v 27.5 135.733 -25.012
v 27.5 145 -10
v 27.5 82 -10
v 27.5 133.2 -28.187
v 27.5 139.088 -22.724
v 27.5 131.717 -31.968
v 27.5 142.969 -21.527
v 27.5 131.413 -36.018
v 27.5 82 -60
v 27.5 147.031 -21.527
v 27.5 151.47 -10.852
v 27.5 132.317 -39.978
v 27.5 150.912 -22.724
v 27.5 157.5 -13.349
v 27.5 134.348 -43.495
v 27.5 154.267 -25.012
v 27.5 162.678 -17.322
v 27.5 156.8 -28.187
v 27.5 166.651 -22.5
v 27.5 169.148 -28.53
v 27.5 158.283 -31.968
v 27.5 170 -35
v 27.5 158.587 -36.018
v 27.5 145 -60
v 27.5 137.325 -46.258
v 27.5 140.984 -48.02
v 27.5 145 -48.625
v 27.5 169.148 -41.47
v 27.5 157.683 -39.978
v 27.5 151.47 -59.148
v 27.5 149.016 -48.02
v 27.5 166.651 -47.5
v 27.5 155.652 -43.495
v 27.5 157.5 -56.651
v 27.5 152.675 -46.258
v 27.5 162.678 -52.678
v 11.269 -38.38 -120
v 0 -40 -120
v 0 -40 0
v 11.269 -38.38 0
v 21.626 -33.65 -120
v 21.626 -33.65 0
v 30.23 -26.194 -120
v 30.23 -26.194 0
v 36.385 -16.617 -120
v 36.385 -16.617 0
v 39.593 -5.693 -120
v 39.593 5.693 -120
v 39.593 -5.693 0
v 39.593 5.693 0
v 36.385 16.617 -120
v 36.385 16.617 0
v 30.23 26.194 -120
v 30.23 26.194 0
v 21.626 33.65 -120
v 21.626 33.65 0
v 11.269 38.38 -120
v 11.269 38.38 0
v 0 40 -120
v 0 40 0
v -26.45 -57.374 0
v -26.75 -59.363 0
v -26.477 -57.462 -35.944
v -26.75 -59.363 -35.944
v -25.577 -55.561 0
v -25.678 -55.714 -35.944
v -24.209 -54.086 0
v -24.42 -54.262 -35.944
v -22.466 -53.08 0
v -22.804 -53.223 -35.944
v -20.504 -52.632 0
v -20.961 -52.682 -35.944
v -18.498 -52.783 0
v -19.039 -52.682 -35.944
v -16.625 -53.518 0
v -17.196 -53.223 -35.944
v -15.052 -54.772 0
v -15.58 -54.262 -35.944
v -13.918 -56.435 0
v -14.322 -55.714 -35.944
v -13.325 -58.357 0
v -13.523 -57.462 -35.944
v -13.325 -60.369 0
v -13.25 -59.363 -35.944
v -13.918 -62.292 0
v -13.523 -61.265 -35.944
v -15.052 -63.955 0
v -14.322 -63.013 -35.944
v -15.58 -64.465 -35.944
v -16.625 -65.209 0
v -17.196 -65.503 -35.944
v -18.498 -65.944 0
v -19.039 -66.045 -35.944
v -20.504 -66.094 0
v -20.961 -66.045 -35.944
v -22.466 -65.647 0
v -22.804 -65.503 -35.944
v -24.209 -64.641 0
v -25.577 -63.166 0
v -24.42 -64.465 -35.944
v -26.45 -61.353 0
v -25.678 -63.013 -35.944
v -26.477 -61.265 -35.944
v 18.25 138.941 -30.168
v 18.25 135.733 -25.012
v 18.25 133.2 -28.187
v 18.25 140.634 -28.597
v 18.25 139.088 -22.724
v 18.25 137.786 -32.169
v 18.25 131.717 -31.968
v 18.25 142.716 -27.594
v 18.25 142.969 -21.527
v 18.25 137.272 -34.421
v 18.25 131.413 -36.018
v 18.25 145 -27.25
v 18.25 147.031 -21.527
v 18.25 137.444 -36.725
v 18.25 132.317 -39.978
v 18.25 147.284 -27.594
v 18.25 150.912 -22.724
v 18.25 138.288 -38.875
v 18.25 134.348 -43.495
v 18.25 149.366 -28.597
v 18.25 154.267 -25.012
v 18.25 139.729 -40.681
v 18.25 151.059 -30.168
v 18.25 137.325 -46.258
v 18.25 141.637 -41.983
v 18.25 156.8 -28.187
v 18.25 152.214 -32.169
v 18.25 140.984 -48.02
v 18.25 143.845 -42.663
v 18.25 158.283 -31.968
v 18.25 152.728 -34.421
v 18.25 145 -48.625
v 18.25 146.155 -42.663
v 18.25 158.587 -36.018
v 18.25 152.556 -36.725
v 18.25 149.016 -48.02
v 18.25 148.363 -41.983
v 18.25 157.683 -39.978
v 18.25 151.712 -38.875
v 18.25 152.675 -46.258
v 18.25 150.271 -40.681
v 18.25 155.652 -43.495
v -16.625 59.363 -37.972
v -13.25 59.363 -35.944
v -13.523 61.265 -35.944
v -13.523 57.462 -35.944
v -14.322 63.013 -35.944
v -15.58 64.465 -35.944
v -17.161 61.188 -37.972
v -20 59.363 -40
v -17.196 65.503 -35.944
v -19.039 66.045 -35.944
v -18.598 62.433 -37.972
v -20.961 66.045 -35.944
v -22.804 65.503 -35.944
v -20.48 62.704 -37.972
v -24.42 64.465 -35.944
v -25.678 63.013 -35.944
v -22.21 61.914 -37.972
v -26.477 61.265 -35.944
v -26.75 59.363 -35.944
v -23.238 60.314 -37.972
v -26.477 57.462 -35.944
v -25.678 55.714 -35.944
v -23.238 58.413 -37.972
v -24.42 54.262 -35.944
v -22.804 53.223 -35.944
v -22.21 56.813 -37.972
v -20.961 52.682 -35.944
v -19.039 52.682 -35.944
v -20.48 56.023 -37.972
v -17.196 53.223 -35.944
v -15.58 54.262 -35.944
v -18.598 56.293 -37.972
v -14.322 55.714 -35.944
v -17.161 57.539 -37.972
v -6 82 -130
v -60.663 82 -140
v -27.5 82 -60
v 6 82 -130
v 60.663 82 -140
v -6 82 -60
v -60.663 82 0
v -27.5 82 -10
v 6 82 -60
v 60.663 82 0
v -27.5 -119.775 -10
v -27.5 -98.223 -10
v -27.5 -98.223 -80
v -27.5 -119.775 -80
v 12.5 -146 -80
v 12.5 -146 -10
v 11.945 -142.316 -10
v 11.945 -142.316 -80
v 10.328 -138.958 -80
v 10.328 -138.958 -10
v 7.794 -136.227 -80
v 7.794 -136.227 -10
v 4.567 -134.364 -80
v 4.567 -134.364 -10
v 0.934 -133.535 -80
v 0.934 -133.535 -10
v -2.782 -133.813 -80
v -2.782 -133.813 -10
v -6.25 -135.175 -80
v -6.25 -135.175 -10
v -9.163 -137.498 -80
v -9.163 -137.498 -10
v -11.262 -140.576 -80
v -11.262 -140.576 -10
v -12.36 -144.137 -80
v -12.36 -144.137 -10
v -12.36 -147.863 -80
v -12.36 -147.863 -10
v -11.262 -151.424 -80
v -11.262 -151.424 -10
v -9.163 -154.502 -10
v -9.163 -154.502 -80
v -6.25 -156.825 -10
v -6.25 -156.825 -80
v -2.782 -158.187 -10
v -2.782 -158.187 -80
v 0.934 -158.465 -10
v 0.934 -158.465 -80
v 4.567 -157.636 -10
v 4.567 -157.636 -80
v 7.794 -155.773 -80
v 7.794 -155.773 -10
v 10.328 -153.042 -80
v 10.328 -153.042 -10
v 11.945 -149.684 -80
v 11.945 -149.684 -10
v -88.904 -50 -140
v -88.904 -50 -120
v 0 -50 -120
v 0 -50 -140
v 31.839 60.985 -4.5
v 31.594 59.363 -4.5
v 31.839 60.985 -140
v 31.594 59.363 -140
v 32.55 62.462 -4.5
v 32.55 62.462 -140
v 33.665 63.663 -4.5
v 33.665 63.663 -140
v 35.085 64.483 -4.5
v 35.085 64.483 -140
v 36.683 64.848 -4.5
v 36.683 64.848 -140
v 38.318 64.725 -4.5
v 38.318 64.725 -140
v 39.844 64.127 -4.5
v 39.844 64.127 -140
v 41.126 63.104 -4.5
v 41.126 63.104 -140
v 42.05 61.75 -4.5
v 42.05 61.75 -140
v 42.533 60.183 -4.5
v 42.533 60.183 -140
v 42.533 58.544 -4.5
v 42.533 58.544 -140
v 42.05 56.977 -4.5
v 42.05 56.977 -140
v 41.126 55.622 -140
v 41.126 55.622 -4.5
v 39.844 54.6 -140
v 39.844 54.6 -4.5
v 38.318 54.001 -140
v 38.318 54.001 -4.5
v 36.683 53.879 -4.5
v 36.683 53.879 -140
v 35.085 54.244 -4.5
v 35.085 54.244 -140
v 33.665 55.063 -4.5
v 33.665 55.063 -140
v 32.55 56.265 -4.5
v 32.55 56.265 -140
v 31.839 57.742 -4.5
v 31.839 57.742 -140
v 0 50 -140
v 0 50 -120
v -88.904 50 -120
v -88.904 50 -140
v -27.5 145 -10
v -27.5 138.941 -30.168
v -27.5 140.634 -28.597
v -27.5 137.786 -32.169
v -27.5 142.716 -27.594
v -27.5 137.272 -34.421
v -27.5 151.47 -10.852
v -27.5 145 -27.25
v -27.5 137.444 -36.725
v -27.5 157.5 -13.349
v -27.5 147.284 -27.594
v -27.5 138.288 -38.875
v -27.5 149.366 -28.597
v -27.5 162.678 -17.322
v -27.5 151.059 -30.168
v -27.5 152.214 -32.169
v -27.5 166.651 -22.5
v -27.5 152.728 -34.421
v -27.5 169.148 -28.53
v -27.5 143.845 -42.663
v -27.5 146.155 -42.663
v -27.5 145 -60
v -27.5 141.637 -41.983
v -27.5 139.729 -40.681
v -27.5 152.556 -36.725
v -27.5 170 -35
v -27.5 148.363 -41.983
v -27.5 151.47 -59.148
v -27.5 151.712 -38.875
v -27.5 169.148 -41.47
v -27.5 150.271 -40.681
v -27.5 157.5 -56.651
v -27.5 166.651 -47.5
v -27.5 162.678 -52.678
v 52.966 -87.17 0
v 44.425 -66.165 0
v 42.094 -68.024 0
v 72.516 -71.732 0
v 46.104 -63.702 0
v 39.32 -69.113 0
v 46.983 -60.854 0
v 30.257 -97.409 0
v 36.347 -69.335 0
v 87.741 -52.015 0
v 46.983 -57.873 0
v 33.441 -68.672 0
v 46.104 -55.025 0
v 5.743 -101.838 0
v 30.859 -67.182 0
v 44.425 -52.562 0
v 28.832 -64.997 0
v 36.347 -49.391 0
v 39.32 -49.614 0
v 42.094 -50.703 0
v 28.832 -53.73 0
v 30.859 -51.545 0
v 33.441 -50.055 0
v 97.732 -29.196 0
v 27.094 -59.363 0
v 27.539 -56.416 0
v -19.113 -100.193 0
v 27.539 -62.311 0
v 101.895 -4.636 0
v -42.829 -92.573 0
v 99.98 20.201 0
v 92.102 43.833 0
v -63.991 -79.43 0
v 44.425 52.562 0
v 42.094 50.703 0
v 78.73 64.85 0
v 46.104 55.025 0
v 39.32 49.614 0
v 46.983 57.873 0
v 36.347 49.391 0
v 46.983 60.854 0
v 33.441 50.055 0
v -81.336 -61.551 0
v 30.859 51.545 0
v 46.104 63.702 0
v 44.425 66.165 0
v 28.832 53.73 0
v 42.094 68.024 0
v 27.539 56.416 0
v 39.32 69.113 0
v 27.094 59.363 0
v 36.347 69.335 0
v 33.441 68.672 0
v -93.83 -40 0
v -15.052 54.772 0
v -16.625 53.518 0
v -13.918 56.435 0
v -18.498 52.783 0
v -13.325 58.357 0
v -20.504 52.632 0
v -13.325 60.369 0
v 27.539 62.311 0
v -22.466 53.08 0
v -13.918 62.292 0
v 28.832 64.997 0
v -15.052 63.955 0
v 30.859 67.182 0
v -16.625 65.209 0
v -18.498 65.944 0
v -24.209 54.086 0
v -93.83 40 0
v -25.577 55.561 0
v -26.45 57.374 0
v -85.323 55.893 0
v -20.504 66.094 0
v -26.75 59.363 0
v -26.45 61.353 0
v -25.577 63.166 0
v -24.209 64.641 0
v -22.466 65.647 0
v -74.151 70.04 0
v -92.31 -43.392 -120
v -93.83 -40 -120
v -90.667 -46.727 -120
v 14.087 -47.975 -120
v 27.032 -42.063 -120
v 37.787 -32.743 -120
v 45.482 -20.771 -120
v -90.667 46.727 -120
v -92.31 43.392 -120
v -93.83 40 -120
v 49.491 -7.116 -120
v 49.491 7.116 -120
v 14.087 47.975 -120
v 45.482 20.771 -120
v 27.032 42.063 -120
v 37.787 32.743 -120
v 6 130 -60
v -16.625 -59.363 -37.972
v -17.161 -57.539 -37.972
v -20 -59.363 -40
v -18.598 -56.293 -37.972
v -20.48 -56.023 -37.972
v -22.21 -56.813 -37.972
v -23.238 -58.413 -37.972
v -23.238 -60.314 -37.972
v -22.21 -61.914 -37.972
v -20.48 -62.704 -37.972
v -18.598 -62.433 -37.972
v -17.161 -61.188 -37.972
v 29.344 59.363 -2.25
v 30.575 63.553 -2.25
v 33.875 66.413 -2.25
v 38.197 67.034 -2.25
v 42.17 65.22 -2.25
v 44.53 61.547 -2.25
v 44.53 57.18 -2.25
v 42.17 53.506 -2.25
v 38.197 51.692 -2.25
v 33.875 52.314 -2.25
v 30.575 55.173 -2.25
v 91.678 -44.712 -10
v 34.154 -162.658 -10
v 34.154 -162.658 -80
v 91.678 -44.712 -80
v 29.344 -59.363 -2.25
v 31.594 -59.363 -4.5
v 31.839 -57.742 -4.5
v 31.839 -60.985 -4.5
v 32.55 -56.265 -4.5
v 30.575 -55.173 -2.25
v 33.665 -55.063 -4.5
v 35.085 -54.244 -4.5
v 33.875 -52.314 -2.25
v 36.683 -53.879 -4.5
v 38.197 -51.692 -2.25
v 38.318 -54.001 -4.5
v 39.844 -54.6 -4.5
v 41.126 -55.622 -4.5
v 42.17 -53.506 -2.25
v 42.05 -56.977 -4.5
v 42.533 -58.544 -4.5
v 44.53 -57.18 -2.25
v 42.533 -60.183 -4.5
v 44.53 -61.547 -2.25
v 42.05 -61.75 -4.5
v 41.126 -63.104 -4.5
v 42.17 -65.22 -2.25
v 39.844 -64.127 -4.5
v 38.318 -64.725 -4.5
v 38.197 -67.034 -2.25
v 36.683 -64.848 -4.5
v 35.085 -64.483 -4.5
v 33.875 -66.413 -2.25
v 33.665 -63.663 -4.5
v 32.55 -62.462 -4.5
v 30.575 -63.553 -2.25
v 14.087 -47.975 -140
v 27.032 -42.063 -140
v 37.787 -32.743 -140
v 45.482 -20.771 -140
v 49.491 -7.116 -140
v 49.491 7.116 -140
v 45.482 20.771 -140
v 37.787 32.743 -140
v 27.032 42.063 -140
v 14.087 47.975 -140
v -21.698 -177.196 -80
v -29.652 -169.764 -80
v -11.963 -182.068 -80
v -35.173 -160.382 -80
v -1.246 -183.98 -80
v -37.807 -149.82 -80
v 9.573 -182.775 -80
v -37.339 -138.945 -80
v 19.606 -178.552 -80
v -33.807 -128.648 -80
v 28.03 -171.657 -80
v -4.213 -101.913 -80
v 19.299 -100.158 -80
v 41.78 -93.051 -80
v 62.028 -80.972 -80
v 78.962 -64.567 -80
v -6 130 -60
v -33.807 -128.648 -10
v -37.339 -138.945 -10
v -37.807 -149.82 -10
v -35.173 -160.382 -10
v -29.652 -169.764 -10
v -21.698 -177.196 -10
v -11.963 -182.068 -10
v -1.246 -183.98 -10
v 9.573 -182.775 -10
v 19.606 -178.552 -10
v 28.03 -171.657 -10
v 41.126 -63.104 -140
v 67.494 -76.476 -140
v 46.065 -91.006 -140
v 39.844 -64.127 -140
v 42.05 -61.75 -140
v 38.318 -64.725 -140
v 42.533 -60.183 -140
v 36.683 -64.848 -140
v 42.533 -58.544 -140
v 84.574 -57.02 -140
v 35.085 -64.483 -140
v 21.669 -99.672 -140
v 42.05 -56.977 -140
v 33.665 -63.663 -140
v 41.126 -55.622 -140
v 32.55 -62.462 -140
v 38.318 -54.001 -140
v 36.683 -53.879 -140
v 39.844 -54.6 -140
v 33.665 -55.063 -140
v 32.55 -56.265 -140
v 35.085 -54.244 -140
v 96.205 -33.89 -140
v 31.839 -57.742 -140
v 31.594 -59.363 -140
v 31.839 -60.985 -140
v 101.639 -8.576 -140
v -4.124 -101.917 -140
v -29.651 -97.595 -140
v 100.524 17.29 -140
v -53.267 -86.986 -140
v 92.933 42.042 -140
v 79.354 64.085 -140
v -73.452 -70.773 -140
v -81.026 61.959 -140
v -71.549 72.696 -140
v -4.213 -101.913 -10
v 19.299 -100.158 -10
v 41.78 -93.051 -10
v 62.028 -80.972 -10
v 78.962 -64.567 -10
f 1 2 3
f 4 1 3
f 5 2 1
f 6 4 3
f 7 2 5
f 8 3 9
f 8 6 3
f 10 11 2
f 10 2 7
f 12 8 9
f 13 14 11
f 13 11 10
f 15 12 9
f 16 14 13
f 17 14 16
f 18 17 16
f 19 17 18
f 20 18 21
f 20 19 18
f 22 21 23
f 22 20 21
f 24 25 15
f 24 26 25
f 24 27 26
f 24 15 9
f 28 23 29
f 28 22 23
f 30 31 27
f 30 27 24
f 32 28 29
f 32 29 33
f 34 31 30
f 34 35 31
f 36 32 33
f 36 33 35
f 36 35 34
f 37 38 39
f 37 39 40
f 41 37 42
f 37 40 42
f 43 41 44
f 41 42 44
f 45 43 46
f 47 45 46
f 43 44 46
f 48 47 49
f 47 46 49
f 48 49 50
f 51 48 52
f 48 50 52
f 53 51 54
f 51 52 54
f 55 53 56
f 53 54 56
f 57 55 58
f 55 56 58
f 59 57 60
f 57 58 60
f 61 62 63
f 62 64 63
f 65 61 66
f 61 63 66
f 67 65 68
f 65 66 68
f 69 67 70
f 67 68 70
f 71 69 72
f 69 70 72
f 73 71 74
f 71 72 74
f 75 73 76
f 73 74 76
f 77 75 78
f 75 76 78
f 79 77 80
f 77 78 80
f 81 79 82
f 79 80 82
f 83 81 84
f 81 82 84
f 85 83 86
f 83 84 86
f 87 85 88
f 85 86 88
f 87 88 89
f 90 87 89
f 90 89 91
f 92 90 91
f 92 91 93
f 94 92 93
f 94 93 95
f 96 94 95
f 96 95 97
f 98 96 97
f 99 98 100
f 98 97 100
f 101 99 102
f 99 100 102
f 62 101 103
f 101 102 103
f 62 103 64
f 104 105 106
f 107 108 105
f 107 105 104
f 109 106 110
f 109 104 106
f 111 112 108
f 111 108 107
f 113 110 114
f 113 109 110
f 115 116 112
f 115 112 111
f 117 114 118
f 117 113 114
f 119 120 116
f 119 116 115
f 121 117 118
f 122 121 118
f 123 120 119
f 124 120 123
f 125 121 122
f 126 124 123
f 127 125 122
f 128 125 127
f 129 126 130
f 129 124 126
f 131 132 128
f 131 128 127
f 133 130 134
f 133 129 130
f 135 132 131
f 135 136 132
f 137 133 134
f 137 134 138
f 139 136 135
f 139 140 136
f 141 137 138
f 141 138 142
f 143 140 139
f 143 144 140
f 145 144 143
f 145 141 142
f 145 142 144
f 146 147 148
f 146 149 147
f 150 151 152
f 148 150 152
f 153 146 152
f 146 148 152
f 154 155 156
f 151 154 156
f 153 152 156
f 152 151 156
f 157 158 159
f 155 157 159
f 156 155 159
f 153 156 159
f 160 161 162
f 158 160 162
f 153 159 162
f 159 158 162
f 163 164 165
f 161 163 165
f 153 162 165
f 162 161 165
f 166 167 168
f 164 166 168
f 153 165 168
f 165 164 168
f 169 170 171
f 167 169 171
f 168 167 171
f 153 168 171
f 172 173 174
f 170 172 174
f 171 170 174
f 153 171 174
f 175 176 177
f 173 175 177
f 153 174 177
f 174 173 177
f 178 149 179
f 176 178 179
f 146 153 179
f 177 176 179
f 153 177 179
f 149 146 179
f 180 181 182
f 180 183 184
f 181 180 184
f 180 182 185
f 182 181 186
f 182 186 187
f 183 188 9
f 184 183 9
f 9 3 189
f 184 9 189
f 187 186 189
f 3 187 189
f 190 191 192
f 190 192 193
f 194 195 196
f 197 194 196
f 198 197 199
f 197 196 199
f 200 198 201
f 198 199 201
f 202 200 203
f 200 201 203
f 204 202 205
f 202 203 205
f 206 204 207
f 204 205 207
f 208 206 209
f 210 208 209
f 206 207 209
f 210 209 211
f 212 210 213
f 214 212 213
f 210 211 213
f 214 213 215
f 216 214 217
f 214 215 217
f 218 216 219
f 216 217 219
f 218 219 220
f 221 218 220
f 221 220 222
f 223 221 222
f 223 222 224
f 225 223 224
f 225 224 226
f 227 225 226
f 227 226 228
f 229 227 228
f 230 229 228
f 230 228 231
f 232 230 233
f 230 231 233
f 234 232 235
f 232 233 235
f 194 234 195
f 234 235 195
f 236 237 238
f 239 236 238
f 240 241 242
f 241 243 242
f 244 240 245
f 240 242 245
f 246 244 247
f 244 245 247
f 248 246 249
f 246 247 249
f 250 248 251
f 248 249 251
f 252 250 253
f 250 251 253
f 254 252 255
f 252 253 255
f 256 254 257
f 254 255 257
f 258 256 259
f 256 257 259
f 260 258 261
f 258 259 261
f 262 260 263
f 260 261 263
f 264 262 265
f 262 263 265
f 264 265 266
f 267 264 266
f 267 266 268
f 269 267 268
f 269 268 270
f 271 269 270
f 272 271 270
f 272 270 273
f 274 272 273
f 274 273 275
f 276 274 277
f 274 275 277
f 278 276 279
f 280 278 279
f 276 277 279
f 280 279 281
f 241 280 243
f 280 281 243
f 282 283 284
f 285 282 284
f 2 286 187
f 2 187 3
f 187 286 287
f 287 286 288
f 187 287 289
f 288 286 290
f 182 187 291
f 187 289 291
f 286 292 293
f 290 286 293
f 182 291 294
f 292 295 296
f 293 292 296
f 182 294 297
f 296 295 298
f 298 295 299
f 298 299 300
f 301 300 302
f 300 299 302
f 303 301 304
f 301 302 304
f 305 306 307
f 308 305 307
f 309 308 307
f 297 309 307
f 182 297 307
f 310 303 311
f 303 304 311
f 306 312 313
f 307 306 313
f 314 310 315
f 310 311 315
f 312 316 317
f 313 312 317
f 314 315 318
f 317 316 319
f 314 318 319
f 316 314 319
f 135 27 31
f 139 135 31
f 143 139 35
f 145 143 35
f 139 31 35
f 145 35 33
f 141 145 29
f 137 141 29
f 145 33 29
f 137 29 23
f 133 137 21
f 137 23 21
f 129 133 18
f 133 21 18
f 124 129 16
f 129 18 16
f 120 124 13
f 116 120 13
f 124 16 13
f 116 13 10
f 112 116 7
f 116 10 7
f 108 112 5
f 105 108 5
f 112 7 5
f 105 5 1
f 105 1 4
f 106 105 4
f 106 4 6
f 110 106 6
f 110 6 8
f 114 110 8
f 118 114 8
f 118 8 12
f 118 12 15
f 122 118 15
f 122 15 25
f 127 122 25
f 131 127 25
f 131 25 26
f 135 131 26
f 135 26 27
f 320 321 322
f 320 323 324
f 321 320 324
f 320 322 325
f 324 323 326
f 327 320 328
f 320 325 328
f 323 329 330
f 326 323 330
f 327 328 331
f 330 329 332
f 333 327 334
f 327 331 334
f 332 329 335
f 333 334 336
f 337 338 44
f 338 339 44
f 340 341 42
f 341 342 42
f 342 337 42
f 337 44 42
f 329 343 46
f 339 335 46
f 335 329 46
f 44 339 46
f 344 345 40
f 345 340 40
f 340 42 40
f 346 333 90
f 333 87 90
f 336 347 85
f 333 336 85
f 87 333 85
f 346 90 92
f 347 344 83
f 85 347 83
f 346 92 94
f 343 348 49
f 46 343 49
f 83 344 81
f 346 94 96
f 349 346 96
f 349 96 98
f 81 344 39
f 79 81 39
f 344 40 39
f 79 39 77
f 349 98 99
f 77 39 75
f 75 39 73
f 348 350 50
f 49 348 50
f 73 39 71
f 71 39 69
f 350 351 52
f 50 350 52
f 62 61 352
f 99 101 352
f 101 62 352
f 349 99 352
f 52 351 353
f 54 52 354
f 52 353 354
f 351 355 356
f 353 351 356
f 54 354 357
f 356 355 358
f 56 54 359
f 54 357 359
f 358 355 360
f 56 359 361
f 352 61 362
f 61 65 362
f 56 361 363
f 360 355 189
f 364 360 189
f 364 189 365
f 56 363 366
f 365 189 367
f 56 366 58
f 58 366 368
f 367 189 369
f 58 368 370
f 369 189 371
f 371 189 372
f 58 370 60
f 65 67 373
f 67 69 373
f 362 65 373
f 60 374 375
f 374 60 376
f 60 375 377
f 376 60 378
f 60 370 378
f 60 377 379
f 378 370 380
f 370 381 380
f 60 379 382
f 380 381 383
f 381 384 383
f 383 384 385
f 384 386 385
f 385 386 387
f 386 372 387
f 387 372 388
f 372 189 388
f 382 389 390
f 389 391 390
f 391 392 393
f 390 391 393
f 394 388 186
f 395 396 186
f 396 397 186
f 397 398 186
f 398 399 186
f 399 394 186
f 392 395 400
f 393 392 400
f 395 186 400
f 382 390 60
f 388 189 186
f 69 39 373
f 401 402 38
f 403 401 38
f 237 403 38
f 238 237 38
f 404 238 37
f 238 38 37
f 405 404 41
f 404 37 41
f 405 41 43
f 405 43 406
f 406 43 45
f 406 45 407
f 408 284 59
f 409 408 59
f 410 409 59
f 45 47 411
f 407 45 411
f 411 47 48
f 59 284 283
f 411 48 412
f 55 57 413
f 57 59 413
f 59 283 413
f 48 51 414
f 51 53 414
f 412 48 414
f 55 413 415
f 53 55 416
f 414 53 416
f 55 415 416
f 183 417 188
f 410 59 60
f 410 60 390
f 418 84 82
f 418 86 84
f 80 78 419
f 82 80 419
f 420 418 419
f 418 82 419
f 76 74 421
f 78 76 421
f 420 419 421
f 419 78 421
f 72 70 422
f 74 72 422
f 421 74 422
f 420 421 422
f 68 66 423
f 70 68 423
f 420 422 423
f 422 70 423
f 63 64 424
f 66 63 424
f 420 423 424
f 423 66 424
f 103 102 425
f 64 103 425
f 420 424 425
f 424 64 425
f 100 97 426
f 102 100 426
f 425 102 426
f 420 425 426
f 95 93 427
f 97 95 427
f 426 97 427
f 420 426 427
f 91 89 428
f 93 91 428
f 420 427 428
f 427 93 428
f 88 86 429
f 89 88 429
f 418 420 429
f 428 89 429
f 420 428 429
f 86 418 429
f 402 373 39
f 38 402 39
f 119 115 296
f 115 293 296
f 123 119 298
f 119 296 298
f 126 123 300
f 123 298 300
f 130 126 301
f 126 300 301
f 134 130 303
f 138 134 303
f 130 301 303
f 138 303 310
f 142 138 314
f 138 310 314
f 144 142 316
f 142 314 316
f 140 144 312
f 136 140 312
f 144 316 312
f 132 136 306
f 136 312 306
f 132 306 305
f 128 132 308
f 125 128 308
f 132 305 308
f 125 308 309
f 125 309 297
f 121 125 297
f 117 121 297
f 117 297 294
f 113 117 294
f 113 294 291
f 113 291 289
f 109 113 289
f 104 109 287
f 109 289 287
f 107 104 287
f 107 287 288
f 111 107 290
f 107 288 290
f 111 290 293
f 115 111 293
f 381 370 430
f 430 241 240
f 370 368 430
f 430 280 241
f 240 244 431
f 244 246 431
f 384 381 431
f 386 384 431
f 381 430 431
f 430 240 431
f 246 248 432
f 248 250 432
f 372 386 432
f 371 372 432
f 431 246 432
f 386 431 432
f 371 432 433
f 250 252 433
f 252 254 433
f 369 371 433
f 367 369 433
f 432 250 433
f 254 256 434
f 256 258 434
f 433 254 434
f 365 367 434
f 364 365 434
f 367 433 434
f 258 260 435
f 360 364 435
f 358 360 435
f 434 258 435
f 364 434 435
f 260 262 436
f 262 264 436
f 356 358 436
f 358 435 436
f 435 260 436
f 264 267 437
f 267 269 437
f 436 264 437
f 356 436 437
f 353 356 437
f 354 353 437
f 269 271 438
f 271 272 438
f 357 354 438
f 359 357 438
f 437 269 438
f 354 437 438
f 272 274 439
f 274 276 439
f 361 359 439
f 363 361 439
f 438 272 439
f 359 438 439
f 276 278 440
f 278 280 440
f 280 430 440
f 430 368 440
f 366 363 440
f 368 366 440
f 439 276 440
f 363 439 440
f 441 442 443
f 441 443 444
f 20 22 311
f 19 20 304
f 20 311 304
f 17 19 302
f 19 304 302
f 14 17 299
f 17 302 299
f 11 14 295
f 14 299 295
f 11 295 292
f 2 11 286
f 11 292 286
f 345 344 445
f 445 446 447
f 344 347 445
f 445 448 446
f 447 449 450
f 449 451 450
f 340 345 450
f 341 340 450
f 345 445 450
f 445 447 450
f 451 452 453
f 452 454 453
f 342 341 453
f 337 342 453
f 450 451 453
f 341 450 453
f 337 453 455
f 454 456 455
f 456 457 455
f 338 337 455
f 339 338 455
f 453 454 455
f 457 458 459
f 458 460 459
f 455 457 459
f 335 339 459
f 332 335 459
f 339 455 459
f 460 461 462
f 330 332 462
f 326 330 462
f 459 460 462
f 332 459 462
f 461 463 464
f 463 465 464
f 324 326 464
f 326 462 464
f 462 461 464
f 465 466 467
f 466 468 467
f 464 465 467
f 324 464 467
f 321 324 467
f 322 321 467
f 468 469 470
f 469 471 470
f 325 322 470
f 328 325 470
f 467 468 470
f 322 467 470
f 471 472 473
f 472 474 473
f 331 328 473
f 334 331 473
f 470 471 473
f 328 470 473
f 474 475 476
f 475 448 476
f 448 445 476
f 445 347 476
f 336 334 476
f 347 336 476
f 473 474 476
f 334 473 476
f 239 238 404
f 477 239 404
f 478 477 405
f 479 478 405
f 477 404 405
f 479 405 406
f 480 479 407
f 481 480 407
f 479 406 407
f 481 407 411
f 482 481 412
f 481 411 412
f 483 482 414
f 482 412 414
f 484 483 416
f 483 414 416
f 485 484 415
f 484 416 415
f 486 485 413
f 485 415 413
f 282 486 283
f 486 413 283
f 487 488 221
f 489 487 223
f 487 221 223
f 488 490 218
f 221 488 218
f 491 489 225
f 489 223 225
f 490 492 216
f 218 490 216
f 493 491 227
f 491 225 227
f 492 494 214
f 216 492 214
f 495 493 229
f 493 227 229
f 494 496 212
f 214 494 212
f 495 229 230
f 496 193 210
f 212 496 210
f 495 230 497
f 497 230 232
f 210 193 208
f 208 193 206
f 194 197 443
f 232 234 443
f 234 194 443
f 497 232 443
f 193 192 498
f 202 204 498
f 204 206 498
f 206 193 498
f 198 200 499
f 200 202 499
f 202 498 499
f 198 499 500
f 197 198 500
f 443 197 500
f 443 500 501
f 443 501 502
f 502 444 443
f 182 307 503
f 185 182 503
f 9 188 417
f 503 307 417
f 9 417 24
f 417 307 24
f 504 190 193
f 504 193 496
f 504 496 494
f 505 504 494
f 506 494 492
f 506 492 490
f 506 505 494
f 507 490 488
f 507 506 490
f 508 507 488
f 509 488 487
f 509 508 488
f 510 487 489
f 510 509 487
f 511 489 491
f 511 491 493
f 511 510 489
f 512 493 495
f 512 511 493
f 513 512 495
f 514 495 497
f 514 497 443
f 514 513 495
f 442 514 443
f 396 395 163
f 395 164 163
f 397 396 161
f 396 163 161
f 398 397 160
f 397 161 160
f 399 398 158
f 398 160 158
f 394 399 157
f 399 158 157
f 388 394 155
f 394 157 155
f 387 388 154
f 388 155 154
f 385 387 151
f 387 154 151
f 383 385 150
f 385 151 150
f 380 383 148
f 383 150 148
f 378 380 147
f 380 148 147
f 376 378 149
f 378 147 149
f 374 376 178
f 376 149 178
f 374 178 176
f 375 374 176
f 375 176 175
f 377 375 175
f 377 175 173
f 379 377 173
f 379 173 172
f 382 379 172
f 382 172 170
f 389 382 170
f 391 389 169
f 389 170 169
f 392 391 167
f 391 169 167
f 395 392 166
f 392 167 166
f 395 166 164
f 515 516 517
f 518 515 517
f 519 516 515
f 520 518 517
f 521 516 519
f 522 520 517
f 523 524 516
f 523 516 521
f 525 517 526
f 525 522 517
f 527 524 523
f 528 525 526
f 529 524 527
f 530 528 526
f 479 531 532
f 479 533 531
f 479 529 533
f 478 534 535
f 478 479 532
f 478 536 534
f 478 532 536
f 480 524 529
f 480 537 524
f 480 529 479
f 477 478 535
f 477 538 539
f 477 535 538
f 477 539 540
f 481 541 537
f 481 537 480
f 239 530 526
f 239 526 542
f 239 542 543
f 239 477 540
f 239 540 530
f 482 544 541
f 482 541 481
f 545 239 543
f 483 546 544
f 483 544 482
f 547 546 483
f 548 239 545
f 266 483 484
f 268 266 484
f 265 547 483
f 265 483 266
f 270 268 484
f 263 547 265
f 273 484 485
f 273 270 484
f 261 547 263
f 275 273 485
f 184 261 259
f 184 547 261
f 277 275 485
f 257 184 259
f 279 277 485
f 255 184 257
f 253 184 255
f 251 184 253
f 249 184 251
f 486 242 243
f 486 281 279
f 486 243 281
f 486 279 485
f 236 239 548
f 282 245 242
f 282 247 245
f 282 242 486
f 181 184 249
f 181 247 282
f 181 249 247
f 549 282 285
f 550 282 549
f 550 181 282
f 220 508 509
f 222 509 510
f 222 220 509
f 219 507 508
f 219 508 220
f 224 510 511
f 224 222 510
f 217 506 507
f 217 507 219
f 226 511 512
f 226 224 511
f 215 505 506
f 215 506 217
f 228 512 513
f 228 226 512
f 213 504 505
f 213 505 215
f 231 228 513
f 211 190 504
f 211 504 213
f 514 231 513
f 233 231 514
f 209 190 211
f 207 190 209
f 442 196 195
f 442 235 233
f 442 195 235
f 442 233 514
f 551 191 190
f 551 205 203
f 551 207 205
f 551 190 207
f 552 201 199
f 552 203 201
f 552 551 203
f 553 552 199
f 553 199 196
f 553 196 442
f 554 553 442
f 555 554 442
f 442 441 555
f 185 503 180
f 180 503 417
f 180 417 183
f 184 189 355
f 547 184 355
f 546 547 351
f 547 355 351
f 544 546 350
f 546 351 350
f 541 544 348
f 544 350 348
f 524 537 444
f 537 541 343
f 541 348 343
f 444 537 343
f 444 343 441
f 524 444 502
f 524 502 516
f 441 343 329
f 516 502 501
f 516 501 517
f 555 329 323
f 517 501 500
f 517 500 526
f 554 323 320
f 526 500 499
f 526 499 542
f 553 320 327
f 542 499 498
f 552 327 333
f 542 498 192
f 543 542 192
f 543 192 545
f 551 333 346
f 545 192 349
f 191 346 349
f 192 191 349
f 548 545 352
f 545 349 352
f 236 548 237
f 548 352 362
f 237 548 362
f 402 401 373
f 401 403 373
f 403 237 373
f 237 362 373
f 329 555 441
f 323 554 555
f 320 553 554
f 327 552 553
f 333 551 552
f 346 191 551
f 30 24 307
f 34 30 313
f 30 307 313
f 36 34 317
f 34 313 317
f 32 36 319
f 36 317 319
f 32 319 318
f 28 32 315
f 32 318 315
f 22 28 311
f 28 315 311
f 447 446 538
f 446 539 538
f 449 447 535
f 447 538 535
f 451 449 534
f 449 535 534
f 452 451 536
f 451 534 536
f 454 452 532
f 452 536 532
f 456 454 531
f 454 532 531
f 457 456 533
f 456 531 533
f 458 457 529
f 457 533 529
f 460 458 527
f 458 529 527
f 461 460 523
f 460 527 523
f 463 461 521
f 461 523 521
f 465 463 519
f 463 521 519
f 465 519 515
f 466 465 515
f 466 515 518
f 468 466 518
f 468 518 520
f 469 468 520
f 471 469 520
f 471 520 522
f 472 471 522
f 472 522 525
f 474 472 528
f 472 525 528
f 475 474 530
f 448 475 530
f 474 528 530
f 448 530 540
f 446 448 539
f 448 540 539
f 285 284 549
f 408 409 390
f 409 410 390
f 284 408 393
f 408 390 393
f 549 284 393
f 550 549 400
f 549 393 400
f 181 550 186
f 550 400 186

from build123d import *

# Parameters (mm, degrees)
BOSS_EXTRUDE1_DEPTH                              = 140
SKETCH2_W                                        = 55
SKETCH2_H                                        = 50
BOSS_EXTRUDE2_DEPTH                              = 88
CUT_EXTRUDE1_DEPTH                               = 256.480429779
RIB1_REACH                                       = 244.701
SKETCH4_WALL_W                                   = 572.27930611
SKETCH4_WALL_H                                   = 12
SKETCH5_R                                        = 12.5
BOSS_EXTRUDE3_DEPTH                              = 70
CSK_FOR_M10_FLAT_HEAD_MACHINE_SCREW1_D           = 11
CSK_FOR_M10_FLAT_HEAD_MACHINE_SCREW1_CSINK_D     = 20
CSK_FOR_M10_FLAT_HEAD_MACHINE_SCREW1_CSINK_ANGLE = 90
F_10_0MM_DOWEL_HOLE2_D                           = 13.5
F_10_0MM_DOWEL_HOLE2_DEPTH                       = 35.944190822
F_10_0MM_DOWEL_HOLE2_TIP                         = 4.055809178
CBORE_FOR_M14_HEX_HEAD_BOLT1_D                   = 15.5
CBORE_FOR_M14_HEX_HEAD_BOLT1_CBORE_D             = 27.25
CBORE_FOR_M14_HEX_HEAD_BOLT1_CBORE_DEPTH         = 9.25
CUT_EXTRUDE2_START                               = -20
CUT_EXTRUDE2_DEPTH                               = 20


with BuildPart() as part:
    # Sketch1 → Boss-Extrude1 (new body)
    with BuildSketch(Plane.XY):
        with BuildLine():
            Line((0, 40), (-93.829632846, 40))
            ThreePointArc((-93.829632846, 40), (-80.04994488, 63.213972543), (-60.663003552, 82))
            Line((-60.663003552, 82), (60.663003552, 82))
            ThreePointArc((60.663003552, 82), (63.213972543, -80.04994488), (-93.829632846, -40))
            Line((-93.829632846, -40), (0, -40))
            ThreePointArc((0, -40), (40, 0), (0, 40))
        make_face()
    extrude(amount=-BOSS_EXTRUDE1_DEPTH)

    # Sketch2 → Boss-Extrude2 (add)
    with BuildSketch(Plane(origin=(0, 170, 0), x_dir=(1, 0, 0), z_dir=(0, 1, 0))):
        with Locations((0, 35)):
            Rectangle(SKETCH2_W, SKETCH2_H)
    extrude(amount=-BOSS_EXTRUDE2_DEPTH)

    # Sketch3 → Cut-Extrude1 (cut, through all)
    with BuildSketch(Plane.ZY.offset(27.5)):
        with BuildLine():
            ThreePointArc((-60, 145), (-52.67766953, 162.67766953), (-35, 170))
            Line((-35, 170), (-60, 170))
            Line((-60, 170), (-60, 145))
        make_face()
        with BuildLine():
            ThreePointArc((-35, 170), (-17.32233047, 162.67766953), (-10, 145))
            Line((-10, 145), (-10, 170))
            Line((-10, 170), (-35, 170))
        make_face()
    extrude(amount=-CUT_EXTRUDE1_DEPTH, mode=Mode.SUBTRACT)

    # Sketch4 wall → Rib1 (add, up to next)
    with BuildSketch(Plane(origin=(0, 106, -95), x_dir=(0, -0.565528355552, -0.824728851846), z_dir=(0, 0.824728851846, -0.565528355552)), mode=Mode.PRIVATE) as rib1_sk1:
        Rectangle(SKETCH4_WALL_W, SKETCH4_WALL_H)
    rib1_tool1 = extrude(rib1_sk1.sketch, amount=-RIB1_REACH, mode=Mode.PRIVATE) - part.part
    add(rib1_tool1.solids().sort_by_distance((0, 106, -95))[0])

    # Sketch5 → Boss-Extrude3 (add)
    with BuildSketch(Plane.XY.offset(-10)):
        with BuildLine():
            Line((-27.5, -98.222960656), (-27.5, -119.775011916))
            ThreePointArc((-27.5, -119.775011916), (-21.697882646, -177.19618388), (34.154451435, -162.657534247))
            Line((34.154451435, -162.657534247), (91.677738062, -44.712328767))
            ThreePointArc((91.677738062, -44.712328767), (41.779689407, -93.050833167), (-27.5, -98.222960656))
        make_face()
        with Locations((0, -146)):
            Circle(SKETCH5_R, mode=Mode.SUBTRACT)
    extrude(amount=-BOSS_EXTRUDE3_DEPTH)

    # CSK for M10 Flat Head Machine Screw1 (through all)
    with Locations(Plane.XY):
        with Locations((37.094348496, -59.363366731), (37.094348496, 59.363366731)):
            CounterSinkHole(CSK_FOR_M10_FLAT_HEAD_MACHINE_SCREW1_D / 2, CSK_FOR_M10_FLAT_HEAD_MACHINE_SCREW1_CSINK_D / 2, counter_sink_angle=CSK_FOR_M10_FLAT_HEAD_MACHINE_SCREW1_CSINK_ANGLE)

    # Ø10.0mm Dowel Hole2
    with Locations(Plane.XY):
        with Locations((-20, 59.363366731), (-20, -59.363366731)):
            Hole(F_10_0MM_DOWEL_HOLE2_D / 2, depth=F_10_0MM_DOWEL_HOLE2_DEPTH)
            with Locations((0, 0, -(F_10_0MM_DOWEL_HOLE2_DEPTH + F_10_0MM_DOWEL_HOLE2_TIP / 2))):  # 118° drill point
                Cone(0, F_10_0MM_DOWEL_HOLE2_D / 2, F_10_0MM_DOWEL_HOLE2_TIP, mode=Mode.SUBTRACT)

    # CBORE for M14 Hex Head Bolt1 (through all)
    with Locations(Plane(origin=(27.5, 0, 0), x_dir=(0, 0, -1), z_dir=(1, 0, 0))):
        with Locations((35, 145)):
            CounterBoreHole(CBORE_FOR_M14_HEX_HEAD_BOLT1_D / 2, CBORE_FOR_M14_HEX_HEAD_BOLT1_CBORE_D / 2, CBORE_FOR_M14_HEX_HEAD_BOLT1_CBORE_DEPTH)

    # Sketch14 → Cut-Extrude2 (cut)
    with BuildSketch(Plane(origin=(0, 0, -140), x_dir=(-1, 0, 0), z_dir=(0, 0, -1)).offset(CUT_EXTRUDE2_START)):
        with BuildLine():
            Line((0, 50), (88.904443084, 50))
            ThreePointArc((88.904443084, 50), (102, 0), (88.904443084, -50))
            Line((88.904443084, -50), (0, -50))
            ThreePointArc((0, -50), (-50, 0), (0, 50))
        make_face()
    extrude(amount=CUT_EXTRUDE2_DEPTH, mode=Mode.SUBTRACT)


solid = part.part
